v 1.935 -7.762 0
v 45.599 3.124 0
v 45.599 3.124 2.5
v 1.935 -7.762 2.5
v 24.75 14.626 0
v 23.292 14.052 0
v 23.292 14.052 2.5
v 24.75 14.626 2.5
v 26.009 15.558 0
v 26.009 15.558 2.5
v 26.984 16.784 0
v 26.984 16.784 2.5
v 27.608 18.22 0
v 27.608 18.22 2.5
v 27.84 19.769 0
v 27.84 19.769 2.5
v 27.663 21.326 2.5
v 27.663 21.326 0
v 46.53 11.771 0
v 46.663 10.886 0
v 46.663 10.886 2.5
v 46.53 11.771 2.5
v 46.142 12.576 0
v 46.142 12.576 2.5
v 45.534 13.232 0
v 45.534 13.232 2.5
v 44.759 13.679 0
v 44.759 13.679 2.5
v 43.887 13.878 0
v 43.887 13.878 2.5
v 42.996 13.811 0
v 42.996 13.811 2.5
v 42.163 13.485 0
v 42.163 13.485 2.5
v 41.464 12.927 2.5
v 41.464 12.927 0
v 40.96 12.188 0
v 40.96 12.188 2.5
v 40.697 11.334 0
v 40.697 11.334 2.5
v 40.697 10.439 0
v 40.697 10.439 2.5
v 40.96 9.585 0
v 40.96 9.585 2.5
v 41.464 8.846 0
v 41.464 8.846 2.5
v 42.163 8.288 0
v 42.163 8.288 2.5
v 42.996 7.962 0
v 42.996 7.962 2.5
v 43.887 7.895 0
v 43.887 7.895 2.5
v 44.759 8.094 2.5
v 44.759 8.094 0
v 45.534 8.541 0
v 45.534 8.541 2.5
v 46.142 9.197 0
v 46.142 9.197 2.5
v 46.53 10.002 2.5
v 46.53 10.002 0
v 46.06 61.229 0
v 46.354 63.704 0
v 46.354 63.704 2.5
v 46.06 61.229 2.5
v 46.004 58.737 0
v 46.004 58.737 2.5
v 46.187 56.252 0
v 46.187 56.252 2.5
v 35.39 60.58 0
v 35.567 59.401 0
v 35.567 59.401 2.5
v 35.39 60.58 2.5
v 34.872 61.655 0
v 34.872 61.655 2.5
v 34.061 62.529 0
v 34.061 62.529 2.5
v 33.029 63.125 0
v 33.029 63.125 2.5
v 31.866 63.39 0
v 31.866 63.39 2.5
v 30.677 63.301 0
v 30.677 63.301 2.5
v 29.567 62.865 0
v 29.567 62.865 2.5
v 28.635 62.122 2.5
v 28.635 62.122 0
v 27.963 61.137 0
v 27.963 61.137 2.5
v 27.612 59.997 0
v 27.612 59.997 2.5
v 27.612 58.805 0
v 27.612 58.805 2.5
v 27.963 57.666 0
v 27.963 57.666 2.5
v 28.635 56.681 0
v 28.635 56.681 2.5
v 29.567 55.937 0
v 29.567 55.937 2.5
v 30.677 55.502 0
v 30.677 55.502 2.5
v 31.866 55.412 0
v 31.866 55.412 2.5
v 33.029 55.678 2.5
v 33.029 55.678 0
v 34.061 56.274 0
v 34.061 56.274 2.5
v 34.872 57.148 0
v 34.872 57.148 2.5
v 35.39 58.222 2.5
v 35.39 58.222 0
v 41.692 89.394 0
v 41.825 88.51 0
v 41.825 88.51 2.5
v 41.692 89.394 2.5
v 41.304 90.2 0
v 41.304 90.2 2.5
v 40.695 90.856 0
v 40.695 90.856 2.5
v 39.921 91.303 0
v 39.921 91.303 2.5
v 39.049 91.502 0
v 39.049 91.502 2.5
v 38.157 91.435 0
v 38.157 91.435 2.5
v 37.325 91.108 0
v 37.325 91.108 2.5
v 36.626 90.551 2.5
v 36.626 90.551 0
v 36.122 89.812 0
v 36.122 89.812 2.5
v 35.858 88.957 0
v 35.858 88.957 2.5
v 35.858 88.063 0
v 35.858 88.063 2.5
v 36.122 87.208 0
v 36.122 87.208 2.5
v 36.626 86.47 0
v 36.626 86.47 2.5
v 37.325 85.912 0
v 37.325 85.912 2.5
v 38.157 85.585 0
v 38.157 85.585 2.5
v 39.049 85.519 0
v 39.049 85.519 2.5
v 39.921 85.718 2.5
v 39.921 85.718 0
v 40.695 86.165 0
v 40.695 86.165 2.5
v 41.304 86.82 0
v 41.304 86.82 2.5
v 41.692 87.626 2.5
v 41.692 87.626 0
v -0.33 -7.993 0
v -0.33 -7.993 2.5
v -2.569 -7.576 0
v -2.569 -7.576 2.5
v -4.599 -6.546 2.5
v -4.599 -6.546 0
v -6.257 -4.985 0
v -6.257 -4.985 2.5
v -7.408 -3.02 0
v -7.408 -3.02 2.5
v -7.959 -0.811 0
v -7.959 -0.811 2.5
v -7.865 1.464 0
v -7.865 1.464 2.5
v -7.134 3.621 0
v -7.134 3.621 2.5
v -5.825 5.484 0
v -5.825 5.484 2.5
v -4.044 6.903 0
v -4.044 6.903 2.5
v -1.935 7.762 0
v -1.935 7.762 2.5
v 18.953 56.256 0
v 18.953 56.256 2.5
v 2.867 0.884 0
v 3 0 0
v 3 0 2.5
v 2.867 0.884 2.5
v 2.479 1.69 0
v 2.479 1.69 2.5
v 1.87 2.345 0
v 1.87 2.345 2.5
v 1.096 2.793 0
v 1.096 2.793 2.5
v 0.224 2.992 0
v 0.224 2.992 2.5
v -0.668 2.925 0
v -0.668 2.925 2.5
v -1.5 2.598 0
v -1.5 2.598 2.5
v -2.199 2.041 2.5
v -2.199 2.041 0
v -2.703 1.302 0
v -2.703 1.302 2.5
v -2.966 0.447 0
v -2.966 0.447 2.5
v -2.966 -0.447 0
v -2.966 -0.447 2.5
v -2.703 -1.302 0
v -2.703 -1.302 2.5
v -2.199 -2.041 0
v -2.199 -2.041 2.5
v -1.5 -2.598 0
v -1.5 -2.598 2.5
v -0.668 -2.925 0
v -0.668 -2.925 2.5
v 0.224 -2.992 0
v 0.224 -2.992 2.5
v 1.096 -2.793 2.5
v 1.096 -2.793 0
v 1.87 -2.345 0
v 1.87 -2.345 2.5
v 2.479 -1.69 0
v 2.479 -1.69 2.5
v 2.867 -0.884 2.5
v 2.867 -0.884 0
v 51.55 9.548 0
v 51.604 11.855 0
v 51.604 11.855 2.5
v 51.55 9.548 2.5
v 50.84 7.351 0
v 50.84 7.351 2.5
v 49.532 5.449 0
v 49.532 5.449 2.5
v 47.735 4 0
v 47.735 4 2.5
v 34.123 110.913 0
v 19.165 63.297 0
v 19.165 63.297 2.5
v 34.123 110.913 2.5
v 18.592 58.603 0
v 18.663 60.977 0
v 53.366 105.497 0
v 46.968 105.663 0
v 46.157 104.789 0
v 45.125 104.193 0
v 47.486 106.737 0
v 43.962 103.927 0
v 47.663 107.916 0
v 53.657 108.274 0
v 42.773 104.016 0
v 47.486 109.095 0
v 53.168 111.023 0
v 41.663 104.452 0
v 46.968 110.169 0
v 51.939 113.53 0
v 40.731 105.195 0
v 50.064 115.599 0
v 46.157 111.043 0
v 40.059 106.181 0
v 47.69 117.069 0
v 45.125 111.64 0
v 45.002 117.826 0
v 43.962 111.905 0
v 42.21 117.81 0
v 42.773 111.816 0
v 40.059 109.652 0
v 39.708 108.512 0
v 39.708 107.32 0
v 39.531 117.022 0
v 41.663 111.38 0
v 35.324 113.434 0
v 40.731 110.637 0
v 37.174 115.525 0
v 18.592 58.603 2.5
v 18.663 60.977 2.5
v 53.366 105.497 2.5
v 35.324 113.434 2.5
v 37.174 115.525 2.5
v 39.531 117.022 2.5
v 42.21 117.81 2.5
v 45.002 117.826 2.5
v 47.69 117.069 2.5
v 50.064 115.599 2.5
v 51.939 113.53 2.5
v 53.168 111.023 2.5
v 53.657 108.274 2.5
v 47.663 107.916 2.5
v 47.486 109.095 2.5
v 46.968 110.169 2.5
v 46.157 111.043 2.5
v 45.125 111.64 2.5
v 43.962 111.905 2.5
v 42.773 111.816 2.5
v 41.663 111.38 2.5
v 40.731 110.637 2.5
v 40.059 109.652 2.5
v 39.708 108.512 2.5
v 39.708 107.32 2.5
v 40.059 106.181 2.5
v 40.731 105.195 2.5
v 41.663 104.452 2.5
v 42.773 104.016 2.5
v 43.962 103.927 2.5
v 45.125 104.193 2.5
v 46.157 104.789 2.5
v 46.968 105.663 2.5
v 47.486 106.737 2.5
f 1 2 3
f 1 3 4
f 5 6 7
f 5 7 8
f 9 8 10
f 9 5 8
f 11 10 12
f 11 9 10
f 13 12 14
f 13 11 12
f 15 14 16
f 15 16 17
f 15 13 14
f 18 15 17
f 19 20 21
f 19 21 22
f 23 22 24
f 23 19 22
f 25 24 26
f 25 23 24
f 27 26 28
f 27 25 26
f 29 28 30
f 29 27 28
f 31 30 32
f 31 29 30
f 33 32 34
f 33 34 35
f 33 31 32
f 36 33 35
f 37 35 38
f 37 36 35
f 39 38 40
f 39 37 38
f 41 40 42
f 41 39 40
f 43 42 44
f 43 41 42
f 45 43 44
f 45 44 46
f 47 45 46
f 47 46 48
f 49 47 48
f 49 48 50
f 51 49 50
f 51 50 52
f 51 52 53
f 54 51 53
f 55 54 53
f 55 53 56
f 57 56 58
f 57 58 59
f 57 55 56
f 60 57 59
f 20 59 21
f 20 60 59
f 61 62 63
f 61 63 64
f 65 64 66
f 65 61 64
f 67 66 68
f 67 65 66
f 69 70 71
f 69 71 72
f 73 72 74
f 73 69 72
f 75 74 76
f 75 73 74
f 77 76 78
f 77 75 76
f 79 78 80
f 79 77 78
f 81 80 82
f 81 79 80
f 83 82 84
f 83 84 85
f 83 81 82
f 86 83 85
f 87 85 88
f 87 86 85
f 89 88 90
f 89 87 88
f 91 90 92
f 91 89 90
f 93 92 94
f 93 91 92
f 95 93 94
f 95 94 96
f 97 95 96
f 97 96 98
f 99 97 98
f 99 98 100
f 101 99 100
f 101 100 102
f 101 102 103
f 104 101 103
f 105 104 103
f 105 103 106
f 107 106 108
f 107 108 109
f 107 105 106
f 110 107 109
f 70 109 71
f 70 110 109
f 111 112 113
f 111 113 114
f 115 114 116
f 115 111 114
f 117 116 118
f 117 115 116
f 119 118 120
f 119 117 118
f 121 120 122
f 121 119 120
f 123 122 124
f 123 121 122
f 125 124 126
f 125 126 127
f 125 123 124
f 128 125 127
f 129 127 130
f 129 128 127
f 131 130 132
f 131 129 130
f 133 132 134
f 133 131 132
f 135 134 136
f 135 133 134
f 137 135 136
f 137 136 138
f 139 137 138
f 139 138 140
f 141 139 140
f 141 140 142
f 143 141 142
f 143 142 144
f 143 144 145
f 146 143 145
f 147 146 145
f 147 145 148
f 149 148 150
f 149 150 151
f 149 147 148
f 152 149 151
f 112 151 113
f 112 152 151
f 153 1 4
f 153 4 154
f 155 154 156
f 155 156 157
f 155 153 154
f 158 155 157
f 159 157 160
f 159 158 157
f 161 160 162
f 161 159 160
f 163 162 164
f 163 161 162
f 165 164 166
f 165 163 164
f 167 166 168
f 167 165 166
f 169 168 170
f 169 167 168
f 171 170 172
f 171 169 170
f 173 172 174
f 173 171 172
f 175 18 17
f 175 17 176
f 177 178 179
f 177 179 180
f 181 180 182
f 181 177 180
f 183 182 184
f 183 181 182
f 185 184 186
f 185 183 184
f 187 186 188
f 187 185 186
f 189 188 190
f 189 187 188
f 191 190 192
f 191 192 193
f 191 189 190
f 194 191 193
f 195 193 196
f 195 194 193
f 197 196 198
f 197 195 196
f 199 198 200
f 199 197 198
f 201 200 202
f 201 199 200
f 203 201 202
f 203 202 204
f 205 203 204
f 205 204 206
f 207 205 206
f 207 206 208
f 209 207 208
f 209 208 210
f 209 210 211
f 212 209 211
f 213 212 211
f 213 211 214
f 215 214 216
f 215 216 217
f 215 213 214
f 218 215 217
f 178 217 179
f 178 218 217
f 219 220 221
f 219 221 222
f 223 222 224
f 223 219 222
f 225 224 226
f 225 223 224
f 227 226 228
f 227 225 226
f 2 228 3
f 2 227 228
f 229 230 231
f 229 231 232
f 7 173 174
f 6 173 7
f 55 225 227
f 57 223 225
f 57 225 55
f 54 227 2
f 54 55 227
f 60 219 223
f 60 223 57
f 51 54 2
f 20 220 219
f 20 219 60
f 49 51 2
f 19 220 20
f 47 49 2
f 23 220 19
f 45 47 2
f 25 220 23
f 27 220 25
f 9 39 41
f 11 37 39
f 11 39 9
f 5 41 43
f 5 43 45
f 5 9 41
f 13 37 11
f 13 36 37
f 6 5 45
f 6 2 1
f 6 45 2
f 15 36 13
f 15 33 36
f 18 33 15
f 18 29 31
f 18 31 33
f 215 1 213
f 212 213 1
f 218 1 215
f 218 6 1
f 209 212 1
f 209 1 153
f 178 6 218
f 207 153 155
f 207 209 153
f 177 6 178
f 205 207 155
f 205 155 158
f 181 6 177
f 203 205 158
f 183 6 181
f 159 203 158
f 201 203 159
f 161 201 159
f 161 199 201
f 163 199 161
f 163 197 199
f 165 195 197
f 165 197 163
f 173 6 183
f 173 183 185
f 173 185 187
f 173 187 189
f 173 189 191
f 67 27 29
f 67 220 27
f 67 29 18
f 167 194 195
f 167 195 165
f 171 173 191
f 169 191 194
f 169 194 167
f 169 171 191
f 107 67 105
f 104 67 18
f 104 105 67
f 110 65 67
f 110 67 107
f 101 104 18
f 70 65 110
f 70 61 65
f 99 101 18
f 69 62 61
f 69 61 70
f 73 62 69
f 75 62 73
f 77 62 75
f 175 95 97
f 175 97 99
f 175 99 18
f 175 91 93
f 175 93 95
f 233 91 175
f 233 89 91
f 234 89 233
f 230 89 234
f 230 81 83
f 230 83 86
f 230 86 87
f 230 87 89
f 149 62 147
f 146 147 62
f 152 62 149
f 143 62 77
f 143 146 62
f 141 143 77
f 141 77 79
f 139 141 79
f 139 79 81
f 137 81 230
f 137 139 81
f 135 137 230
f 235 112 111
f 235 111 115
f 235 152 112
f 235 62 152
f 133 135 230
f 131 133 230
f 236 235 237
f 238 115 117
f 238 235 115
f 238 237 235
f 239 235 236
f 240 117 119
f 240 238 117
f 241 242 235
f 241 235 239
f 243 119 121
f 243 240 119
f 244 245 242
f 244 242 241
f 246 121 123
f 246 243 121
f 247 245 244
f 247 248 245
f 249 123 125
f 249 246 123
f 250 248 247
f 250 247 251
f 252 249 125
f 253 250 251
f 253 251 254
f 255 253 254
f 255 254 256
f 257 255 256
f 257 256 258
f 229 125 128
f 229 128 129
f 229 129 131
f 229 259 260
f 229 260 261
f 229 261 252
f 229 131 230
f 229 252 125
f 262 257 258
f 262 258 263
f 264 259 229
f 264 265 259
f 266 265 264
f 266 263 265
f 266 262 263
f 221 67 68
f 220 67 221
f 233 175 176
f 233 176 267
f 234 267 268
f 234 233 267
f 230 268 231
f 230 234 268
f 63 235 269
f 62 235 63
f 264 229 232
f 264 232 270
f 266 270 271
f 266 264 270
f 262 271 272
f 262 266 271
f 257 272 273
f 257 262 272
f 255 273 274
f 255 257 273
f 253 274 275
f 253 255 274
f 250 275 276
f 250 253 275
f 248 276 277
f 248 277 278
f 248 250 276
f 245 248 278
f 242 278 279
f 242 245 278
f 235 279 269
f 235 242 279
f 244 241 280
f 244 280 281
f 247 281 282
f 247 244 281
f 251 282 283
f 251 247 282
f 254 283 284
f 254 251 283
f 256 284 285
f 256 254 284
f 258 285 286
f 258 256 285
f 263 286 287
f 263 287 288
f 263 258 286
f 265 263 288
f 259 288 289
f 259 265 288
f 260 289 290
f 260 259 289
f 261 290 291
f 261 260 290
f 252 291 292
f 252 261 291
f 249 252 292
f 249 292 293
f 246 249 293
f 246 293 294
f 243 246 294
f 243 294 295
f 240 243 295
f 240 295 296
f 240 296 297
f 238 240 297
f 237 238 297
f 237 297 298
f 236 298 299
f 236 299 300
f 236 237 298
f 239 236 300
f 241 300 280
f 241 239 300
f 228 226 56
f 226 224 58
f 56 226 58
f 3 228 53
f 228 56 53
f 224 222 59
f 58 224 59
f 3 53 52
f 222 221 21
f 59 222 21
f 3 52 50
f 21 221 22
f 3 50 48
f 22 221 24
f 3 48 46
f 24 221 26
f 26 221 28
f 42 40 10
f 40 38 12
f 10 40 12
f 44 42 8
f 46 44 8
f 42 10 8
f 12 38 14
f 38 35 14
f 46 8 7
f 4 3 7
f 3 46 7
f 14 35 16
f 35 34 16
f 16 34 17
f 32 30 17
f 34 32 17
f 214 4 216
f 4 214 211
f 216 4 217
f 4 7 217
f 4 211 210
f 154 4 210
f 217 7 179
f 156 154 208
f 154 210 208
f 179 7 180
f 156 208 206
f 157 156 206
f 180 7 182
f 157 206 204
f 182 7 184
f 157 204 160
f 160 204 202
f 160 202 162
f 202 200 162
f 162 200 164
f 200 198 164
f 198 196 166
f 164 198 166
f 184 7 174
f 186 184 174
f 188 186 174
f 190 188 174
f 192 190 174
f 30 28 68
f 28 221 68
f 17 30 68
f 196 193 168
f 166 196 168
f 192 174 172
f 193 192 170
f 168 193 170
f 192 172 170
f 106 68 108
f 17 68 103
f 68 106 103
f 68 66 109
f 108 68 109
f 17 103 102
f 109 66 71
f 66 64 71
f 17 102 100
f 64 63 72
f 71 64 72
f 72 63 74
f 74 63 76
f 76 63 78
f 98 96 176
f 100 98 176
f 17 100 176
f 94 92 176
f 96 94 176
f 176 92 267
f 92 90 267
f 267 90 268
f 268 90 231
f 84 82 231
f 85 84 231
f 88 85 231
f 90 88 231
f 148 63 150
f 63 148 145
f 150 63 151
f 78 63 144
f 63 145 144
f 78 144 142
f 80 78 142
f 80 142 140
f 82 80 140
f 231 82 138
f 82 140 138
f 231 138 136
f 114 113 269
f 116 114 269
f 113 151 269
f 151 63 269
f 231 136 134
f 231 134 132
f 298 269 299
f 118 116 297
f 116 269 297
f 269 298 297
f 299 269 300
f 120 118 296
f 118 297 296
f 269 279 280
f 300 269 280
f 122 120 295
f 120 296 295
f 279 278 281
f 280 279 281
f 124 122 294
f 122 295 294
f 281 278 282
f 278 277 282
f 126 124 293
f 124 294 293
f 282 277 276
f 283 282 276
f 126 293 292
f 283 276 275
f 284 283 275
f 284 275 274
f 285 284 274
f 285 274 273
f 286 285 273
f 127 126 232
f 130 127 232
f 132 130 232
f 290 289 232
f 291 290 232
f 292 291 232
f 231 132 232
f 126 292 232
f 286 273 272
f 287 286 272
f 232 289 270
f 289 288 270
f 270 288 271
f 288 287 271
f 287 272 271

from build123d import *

# Parameters (mm, degrees)
SKETCH1_R           = 3
SKETCH1_R_2         = 4
BOSS_EXTRUDE1_DEPTH = 2.5


with BuildPart() as part:
    # Sketch1 → Boss-Extrude1 (new body)
    with BuildSketch(Plane.XY):
        with BuildLine():
            Line((-1.935375165, 7.76236581), (23.292313718, 14.052335096))
            ThreePointArc((23.292313718, 14.052335096), (26.983786149, 16.783881004), (27.662556702, 21.325640827))
            Line((27.662556702, 21.325640827), (18.953368461, 56.256286973))
            ThreePointArc((18.953368461, 56.256286973), (18.573069496, 59.791447393), (19.164792931, 63.297420849))
            Line((19.164792931, 63.297420849), (34.122984627, 110.913095801))
            ThreePointArc((34.122984627, 110.913095801), (46.372656677, 117.54203466), (53.366264945, 105.496838974))
            Line((53.366264945, 105.496838974), (46.354025639, 63.703511227))
            ThreePointArc((46.354025639, 63.703511227), (46.002134254, 59.983795798), (46.187035414, 56.252050633))
            Line((46.187035414, 56.252050633), (51.60440687, 11.855476374))
            ThreePointArc((51.60440687, 11.855476374), (50.25461519, 6.352759975), (45.598682847, 3.124119492))
            Line((45.598682847, 3.124119492), (1.935375165, -7.76236581))
            ThreePointArc((1.935375165, -7.76236581), (-7.76236581, -1.935375165), (-1.935375165, 7.76236581))
        make_face()
        Circle(SKETCH1_R, mode=Mode.SUBTRACT)
        with Locations((43.663307682, 107.91605793)):
            Circle(SKETCH1_R_2, mode=Mode.SUBTRACT)
        with Locations((31.567212902, 59.401271616)):
            Circle(SKETCH1_R_2, mode=Mode.SUBTRACT)
        with Locations((38.82486977, 88.510143404)):
            Circle(SKETCH1_R, mode=Mode.SUBTRACT)
        with Locations((43.663307682, 10.886485302)):
            Circle(SKETCH1_R, mode=Mode.SUBTRACT)
    extrude(amount=BOSS_EXTRUDE1_DEPTH)


solid = part.part
